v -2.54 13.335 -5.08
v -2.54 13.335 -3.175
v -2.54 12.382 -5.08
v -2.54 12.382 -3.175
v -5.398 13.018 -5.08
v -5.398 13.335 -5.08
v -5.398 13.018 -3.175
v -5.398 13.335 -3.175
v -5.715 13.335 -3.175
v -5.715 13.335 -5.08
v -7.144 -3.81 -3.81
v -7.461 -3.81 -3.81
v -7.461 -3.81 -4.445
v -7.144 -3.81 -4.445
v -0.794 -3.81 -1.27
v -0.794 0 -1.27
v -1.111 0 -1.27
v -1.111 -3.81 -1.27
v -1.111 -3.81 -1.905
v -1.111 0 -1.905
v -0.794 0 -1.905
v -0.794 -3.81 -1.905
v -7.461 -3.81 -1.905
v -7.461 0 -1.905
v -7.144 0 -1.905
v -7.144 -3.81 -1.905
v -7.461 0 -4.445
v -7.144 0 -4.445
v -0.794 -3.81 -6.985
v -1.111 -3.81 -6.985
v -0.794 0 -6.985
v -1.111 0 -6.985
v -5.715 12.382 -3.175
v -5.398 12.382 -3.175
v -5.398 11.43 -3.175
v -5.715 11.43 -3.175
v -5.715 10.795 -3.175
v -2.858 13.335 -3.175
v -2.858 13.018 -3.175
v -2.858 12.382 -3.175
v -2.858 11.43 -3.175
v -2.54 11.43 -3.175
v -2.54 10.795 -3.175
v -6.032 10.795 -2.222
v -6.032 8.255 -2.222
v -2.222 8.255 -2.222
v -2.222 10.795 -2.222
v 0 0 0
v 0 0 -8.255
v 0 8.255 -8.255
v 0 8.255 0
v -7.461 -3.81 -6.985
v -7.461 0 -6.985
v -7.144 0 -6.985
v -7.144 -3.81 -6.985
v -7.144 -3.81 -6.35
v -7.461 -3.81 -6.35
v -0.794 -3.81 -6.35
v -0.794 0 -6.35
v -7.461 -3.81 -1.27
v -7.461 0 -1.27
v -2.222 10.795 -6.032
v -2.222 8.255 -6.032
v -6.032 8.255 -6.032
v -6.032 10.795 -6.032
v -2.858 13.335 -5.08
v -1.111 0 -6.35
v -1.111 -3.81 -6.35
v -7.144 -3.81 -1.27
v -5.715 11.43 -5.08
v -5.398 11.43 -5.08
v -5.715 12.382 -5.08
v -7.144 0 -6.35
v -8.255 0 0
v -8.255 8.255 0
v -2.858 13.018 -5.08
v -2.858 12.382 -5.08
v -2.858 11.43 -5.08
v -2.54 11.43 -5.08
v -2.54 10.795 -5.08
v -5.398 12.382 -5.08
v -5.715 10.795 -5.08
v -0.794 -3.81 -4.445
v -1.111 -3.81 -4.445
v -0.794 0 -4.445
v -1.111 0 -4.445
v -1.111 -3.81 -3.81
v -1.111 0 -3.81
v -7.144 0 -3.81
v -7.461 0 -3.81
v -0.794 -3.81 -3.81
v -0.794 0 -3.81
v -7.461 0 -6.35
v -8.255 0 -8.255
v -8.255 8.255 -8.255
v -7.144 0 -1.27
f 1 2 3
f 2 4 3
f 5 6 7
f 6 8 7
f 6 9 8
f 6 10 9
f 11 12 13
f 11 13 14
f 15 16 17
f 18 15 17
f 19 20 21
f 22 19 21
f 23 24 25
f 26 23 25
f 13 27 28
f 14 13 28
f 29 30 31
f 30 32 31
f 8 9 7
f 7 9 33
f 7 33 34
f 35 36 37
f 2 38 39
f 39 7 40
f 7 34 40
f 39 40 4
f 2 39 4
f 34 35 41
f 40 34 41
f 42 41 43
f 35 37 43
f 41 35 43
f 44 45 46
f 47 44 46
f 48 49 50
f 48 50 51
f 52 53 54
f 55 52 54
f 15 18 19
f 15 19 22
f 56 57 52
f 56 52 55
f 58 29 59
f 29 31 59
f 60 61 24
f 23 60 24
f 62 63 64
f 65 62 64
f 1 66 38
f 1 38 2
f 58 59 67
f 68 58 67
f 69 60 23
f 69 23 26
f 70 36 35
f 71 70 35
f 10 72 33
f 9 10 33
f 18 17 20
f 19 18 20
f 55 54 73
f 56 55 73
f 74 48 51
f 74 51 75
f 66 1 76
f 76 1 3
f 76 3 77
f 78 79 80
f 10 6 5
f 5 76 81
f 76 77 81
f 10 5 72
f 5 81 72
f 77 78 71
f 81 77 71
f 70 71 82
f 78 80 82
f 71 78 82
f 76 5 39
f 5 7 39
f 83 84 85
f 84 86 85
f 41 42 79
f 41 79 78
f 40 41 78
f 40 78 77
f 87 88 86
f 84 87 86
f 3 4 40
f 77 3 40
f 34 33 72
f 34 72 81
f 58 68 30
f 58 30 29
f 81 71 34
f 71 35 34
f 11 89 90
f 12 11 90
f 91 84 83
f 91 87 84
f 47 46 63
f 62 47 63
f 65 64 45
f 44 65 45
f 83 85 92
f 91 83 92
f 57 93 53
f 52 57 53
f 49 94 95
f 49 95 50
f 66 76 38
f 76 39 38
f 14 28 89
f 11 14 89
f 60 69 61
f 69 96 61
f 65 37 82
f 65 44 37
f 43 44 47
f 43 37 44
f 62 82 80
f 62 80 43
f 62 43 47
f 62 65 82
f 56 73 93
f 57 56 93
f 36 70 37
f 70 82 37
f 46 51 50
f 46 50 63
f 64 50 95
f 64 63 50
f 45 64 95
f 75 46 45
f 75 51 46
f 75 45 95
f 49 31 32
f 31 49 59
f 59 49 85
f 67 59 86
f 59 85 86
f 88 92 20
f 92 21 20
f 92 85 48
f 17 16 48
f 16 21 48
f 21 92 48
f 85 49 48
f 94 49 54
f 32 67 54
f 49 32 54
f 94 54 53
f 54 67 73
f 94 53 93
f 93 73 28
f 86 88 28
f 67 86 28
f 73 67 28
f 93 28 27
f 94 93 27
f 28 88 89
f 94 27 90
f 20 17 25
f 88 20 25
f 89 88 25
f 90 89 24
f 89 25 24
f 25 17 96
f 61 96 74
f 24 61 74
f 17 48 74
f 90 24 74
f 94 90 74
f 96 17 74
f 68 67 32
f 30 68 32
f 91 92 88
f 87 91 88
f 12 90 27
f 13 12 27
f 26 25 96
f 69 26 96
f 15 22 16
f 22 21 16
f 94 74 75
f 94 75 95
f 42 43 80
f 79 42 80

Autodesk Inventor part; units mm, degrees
ref_plane "YZ Plane" through (0, 0, 0) normal (1, 0, 0) x (0, 1, 0)
ref_plane "XZ Plane" through (0, 0, 0) normal (0, 1, 0) x (-1, 0, 0)
sketch "Náčrt1" plane through (0, 0, 0) normal (0, 1, 0) x (-1, 0, 0)
  line L0 (0, 0) -> (8.255, 0)
  line L1 (8.255, 0) -> (8.255, -8.255)
  line L2 (8.255, -8.255) -> (0, -8.255)
  line L3 (0, -8.255) -> (0, 0)
  dimension "d0" = 8.255
  dimension "d1" = 8.255
extrude "Vysunutí1" add sketch "Náčrt1" along normal blind 8.255
sketch "Náčrt2" plane through (0, 0, 0) normal (0, -1, 0) x (1, 0, 0)
  line L0 (0, 0) -> (-8.255, 0) projected
  line L1 (0, -8.255) -> (0, 0) projected
  line L2 (-0.7937, -1.27) -> (-1.1113, -1.27)
  line L3 (-1.1113, -1.27) -> (-1.1112, -1.905)
  line L4 (-1.1112, -1.905) -> (-0.7937, -1.905)
  line L5 (-0.7937, -1.905) -> (-0.7937, -1.27)
  line L6 (-0.7937, -3.81) -> (-1.1113, -3.81)
  line L7 (-1.1113, -3.81) -> (-1.1112, -4.445)
  line L8 (-1.1112, -4.445) -> (-0.7937, -4.445)
  line L9 (-0.7937, -4.445) -> (-0.7937, -3.81)
  line L10 (-0.7938, -6.35) -> (-1.1113, -6.35)
  line L11 (-1.1113, -6.35) -> (-1.1112, -6.985)
  line L12 (-1.1112, -6.985) -> (-0.7937, -6.985)
  line L13 (-0.7937, -6.985) -> (-0.7938, -6.35)
  line L14 (-7.1438, -1.27) -> (-7.4613, -1.27)
  line L15 (-7.4613, -1.27) -> (-7.4613, -1.905)
  line L16 (-7.4613, -1.905) -> (-7.1438, -1.905)
  line L17 (-7.1438, -1.905) -> (-7.1438, -1.27)
  line L18 (-7.1438, -3.81) -> (-7.4613, -3.81)
  line L19 (-7.4613, -3.81) -> (-7.4613, -4.445)
  line L20 (-7.4613, -4.445) -> (-7.1438, -4.445)
  line L21 (-7.1438, -4.445) -> (-7.1438, -3.81)
  line L22 (-7.1438, -6.35) -> (-7.4613, -6.35)
  line L23 (-7.4613, -6.35) -> (-7.4613, -6.985)
  line L24 (-7.4613, -6.985) -> (-7.1438, -6.985)
  line L25 (-7.1438, -6.985) -> (-7.1438, -6.35)
  point P0 (-4.1275, -4.1275)
  point P1 (-4.1275, -4.1275)
  dimension "d4" = 0.3175
  dimension "d5" = 0.635
  dimension "d8" = 2.54
  dimension "d11" = 6.35
  dimension "d15" = 8.255
extrude "Vysunutí2" add sketch "Náčrt2" along normal blind 3.81
sketch "Náčrt3" plane through (0, 8.255, 0) normal (0, 1, 0) x (1, 0, 0)
  line L0 (-6.0325, 2.2225) -> (-2.2225, 2.2225)
  line L1 (-2.2225, 2.2225) -> (-2.2225, 6.0325)
  line L2 (-2.2225, 6.0325) -> (-6.0325, 6.0325)
  line L3 (-6.0325, 6.0325) -> (-6.0325, 2.2225)
  line L4 (-6.0325, 2.2225) -> (-2.2225, 6.0325) construction
  line L5 (-2.2225, 2.2225) -> (-6.0325, 6.0325) construction
  point P0 (-4.1275, 4.1275)
  dimension "d18" = 3.81
  dimension "d19" = 3.81
extrude "Vysunutí3" add sketch "Náčrt3" along normal blind 2.54
sketch "Náčrt4" plane through (0, 10.795, 0) normal (0, 1, 0) x (1, 0, 0)
  line L0 (-5.715, 3.175) -> (-2.54, 3.175)
  line L1 (-2.54, 3.175) -> (-2.54, 5.08)
  line L2 (-2.54, 5.08) -> (-5.715, 5.08)
  line L3 (-5.715, 5.08) -> (-5.715, 3.175)
  line L4 (-5.715, 3.175) -> (-2.54, 5.08) construction
  line L5 (-2.54, 3.175) -> (-5.715, 5.08) construction
  point P0 (0, 0)
  point P1 (-4.1275, 4.1275)
  dimension "d22" = 3.175
  dimension "d23" = 1.905
extrude "Vysunutí4" add sketch "Náčrt4" along normal blind 2.54
sketch "Náčrt6" plane through (-5.715, 10.795, -3.175) normal (0, 0, 1) x (1, 0, 0)
  line L0 (0, 2.54) -> (3.175, 2.54) projected
  line L1 (0.3175, 2.2225) -> (2.8575, 2.2225)
  line L2 (2.8575, 2.2225) -> (2.8575, 2.54)
  line L3 (0.3175, 2.54) -> (0.3175, 2.2225)
  line L4 (0, 0.635) -> (0.3175, 0.635)
  line L5 (0.3175, 0.635) -> (0.3175, 1.5875)
  line L6 (3.175, 0.635) -> (2.8575, 0.635)
  line L7 (2.8575, 0.635) -> (2.8575, 1.5875)
  line L8 (0.3175, 2.54) -> (2.8575, 2.54)
  line L9 (3.175, 1.5875) -> (3.175, 0.635)
  line L10 (0, 1.5875) -> (0, 0.635)
  line L11 (0, 0) -> (0, 2.54) projected
  line L12 (0, 1.5875) -> (0.3175, 1.5875)
  line L13 (3.175, 0) -> (3.175, 2.54) projected
  line L14 (3.175, 1.5875) -> (2.8575, 1.5875)
  point P0 (5.715, -10.795)
  point P1 (1.5875, 2.54)
extrude "Vysunutí5" cut sketch "Náčrt6" against normal up to next
ref_plane "Pracovní rovina1" through (0, 4.1275, 0) normal (0, -1, 0) x (1, 0, 0)
split_face "Rozdělit1"
sketch "Náčrt7" plane through (-8.255, 0, 0) normal (0, 0, 1) x (1, 0, 0)
  line L0 (0, 4.1275) -> (8.255, 4.1275) projected
  line L1 (8.255, 0) -> (0, 0) projected
  line L2 (5.715, 4.1275) -> (5.715, 2.2225)
  line L3 (2.54, 2.2225) -> (2.54, 4.1275)
  line L4 (1.27, 0) -> (6.985, 0)
  line L5 (6.985, 0) -> (6.985, 2.2225)
  line L6 (1.27, 2.2225) -> (1.27, 0)
  line L7 (1.27, 2.2225) -> (2.54, 2.2225)
  line L8 (5.715, 2.2225) -> (6.985, 2.2225)
  line L9 (2.54, 4.1275) -> (5.715, 4.1275)
  point P0 (4.1275, 4.1275)
  point P1 (4.1275, 2.2225)
split_face "Rozdělit2"
properties part number "PushButton"
